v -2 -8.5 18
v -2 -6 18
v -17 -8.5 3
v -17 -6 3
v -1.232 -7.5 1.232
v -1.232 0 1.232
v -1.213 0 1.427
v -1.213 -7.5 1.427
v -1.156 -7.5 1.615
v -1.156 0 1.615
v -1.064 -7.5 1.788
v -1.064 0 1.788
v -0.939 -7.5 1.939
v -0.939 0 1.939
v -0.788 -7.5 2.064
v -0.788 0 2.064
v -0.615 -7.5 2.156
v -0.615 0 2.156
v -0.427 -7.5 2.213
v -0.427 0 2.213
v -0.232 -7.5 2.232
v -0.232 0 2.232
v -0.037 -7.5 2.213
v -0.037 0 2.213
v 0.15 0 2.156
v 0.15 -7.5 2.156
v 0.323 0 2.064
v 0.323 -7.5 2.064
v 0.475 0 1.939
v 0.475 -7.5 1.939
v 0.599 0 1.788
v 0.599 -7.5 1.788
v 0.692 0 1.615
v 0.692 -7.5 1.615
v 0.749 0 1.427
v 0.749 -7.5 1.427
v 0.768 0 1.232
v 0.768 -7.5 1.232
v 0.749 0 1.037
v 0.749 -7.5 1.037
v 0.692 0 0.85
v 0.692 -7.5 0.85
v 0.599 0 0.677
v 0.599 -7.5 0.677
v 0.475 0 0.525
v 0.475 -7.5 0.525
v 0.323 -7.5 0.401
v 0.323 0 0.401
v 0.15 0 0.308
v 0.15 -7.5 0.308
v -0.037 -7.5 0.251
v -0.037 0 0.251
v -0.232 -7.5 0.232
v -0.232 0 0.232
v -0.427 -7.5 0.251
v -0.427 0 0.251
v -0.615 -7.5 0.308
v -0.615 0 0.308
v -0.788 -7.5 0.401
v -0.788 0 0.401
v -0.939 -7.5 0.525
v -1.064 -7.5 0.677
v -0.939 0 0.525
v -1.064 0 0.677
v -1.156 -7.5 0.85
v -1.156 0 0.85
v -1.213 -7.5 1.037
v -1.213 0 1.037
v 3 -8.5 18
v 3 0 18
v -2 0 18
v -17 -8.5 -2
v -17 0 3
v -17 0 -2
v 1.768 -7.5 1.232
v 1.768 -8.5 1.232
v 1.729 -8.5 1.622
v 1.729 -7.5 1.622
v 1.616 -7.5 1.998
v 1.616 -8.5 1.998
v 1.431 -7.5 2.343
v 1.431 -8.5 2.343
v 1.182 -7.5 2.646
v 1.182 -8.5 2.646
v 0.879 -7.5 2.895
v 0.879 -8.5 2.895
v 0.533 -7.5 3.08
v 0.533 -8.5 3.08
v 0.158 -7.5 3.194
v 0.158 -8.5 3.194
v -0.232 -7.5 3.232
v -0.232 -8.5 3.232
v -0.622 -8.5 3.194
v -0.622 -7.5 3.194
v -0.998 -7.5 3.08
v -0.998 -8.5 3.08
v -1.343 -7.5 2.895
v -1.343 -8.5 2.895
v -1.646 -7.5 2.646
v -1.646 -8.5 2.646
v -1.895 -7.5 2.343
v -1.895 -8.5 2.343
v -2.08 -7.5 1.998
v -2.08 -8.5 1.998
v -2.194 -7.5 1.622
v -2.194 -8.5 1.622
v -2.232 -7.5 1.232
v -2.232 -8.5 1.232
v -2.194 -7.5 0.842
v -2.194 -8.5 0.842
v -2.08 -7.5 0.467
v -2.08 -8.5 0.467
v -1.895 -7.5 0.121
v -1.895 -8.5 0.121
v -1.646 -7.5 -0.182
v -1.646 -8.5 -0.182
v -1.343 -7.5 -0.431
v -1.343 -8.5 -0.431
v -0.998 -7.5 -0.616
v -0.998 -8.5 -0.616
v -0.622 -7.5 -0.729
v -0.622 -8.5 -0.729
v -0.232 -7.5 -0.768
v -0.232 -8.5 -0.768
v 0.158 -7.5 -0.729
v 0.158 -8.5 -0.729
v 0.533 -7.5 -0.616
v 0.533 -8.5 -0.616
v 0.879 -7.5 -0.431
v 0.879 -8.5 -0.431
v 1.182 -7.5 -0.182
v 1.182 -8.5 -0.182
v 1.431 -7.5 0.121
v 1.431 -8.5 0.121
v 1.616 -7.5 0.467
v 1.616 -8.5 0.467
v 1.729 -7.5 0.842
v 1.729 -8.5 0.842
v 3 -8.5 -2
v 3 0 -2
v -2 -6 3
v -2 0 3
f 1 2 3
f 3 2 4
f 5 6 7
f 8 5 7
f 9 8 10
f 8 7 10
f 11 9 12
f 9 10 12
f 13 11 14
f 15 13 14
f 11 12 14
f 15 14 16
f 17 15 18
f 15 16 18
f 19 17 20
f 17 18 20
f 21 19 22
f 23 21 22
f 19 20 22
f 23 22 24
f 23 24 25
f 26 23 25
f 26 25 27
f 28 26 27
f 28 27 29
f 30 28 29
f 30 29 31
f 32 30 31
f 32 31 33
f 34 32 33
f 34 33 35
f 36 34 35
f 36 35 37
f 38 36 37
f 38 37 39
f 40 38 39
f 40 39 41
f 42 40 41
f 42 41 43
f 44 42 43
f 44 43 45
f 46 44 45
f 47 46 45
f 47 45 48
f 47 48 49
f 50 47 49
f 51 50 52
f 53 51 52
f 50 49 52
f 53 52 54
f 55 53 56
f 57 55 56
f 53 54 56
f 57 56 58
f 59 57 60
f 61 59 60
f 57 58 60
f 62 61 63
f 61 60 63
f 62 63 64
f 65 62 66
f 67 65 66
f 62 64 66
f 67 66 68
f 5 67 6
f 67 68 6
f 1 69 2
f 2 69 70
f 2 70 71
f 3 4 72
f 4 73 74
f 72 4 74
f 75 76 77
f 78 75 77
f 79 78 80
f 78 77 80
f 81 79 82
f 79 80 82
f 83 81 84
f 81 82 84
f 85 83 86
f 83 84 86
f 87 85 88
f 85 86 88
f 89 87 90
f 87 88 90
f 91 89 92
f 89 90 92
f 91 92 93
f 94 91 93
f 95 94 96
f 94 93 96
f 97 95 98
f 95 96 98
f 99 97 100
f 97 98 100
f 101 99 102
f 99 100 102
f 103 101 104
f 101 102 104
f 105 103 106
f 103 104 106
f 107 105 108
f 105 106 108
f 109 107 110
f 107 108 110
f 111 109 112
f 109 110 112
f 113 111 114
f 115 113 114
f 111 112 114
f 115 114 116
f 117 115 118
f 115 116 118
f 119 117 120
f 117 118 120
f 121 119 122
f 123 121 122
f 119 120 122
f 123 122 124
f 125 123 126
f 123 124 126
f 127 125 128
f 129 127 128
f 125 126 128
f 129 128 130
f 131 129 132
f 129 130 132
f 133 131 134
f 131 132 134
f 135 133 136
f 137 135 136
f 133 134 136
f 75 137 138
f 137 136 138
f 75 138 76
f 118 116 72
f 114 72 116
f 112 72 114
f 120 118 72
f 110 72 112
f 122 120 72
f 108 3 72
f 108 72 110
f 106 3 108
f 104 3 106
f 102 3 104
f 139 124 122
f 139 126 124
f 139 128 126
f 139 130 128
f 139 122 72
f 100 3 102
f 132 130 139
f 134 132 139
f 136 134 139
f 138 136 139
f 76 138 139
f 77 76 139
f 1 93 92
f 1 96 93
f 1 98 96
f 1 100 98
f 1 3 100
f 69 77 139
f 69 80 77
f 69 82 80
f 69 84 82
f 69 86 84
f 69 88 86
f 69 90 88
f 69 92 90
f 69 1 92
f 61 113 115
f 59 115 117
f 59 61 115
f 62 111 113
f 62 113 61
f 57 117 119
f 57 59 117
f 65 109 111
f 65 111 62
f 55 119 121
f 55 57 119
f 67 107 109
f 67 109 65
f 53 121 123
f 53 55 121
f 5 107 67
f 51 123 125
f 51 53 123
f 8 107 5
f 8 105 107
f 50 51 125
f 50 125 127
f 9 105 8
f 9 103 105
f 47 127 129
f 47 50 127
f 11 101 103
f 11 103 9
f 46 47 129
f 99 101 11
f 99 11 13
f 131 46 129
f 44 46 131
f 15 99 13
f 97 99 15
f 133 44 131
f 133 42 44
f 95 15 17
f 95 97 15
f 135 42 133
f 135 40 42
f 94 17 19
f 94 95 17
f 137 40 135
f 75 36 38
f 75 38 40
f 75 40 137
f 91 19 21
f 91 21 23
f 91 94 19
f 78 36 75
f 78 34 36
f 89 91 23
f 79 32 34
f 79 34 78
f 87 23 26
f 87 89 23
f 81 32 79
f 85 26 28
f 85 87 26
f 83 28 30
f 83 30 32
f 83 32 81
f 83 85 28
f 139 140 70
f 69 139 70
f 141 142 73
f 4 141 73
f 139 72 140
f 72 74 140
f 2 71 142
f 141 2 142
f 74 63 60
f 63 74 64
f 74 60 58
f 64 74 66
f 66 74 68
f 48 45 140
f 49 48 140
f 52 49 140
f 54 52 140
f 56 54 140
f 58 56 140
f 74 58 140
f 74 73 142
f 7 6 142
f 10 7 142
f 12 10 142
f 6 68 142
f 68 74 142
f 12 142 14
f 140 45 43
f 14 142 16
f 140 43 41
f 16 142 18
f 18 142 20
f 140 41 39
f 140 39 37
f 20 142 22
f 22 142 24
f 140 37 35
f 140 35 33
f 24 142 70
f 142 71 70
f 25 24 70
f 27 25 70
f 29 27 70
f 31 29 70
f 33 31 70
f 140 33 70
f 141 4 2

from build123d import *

# Parameters (mm, degrees)
F1_DEPTH = 6
F3_DEPTH = 2.5
F4_R     = 1
F5_DEPTH = 8.501
F6_R     = 2
F7_DEPTH = 1


with BuildPart() as f1:
    # F0 (on Front) → F1 (new body)
    with BuildSketch(Plane.XZ):
        Polygon((3, -2), (3, 18), (-2, 18), (-2, 3), (-17, 3), (-17, -2), align=None)
    extrude(amount=F1_DEPTH)

    # F2 (on face) → F3 (join)
    with BuildSketch(Plane.XZ.offset(6)):
        Polygon((-2, 18), (-17, 3), (-17, -2), (3, -2), (3, 18), align=None)
    extrude(amount=F3_DEPTH)

    # F4 (on face) → F5 (cut, through all)
    with BuildSketch(Plane(origin=(0, 0, 0), x_dir=(-1, 0, 0), z_dir=(0, 1, 0))):
        with Locations((0.232233, 1.232233)):
            Circle(F4_R)
    extrude(amount=-F5_DEPTH, mode=Mode.SUBTRACT)

    # F6 (on face) → F7 (cut)
    with BuildSketch(Plane.XZ.offset(8.5)):
        with Locations((-0.232233, 1.232233)):
            Circle(F6_R)
    extrude(amount=-F7_DEPTH, mode=Mode.SUBTRACT)


solid = f1.part
